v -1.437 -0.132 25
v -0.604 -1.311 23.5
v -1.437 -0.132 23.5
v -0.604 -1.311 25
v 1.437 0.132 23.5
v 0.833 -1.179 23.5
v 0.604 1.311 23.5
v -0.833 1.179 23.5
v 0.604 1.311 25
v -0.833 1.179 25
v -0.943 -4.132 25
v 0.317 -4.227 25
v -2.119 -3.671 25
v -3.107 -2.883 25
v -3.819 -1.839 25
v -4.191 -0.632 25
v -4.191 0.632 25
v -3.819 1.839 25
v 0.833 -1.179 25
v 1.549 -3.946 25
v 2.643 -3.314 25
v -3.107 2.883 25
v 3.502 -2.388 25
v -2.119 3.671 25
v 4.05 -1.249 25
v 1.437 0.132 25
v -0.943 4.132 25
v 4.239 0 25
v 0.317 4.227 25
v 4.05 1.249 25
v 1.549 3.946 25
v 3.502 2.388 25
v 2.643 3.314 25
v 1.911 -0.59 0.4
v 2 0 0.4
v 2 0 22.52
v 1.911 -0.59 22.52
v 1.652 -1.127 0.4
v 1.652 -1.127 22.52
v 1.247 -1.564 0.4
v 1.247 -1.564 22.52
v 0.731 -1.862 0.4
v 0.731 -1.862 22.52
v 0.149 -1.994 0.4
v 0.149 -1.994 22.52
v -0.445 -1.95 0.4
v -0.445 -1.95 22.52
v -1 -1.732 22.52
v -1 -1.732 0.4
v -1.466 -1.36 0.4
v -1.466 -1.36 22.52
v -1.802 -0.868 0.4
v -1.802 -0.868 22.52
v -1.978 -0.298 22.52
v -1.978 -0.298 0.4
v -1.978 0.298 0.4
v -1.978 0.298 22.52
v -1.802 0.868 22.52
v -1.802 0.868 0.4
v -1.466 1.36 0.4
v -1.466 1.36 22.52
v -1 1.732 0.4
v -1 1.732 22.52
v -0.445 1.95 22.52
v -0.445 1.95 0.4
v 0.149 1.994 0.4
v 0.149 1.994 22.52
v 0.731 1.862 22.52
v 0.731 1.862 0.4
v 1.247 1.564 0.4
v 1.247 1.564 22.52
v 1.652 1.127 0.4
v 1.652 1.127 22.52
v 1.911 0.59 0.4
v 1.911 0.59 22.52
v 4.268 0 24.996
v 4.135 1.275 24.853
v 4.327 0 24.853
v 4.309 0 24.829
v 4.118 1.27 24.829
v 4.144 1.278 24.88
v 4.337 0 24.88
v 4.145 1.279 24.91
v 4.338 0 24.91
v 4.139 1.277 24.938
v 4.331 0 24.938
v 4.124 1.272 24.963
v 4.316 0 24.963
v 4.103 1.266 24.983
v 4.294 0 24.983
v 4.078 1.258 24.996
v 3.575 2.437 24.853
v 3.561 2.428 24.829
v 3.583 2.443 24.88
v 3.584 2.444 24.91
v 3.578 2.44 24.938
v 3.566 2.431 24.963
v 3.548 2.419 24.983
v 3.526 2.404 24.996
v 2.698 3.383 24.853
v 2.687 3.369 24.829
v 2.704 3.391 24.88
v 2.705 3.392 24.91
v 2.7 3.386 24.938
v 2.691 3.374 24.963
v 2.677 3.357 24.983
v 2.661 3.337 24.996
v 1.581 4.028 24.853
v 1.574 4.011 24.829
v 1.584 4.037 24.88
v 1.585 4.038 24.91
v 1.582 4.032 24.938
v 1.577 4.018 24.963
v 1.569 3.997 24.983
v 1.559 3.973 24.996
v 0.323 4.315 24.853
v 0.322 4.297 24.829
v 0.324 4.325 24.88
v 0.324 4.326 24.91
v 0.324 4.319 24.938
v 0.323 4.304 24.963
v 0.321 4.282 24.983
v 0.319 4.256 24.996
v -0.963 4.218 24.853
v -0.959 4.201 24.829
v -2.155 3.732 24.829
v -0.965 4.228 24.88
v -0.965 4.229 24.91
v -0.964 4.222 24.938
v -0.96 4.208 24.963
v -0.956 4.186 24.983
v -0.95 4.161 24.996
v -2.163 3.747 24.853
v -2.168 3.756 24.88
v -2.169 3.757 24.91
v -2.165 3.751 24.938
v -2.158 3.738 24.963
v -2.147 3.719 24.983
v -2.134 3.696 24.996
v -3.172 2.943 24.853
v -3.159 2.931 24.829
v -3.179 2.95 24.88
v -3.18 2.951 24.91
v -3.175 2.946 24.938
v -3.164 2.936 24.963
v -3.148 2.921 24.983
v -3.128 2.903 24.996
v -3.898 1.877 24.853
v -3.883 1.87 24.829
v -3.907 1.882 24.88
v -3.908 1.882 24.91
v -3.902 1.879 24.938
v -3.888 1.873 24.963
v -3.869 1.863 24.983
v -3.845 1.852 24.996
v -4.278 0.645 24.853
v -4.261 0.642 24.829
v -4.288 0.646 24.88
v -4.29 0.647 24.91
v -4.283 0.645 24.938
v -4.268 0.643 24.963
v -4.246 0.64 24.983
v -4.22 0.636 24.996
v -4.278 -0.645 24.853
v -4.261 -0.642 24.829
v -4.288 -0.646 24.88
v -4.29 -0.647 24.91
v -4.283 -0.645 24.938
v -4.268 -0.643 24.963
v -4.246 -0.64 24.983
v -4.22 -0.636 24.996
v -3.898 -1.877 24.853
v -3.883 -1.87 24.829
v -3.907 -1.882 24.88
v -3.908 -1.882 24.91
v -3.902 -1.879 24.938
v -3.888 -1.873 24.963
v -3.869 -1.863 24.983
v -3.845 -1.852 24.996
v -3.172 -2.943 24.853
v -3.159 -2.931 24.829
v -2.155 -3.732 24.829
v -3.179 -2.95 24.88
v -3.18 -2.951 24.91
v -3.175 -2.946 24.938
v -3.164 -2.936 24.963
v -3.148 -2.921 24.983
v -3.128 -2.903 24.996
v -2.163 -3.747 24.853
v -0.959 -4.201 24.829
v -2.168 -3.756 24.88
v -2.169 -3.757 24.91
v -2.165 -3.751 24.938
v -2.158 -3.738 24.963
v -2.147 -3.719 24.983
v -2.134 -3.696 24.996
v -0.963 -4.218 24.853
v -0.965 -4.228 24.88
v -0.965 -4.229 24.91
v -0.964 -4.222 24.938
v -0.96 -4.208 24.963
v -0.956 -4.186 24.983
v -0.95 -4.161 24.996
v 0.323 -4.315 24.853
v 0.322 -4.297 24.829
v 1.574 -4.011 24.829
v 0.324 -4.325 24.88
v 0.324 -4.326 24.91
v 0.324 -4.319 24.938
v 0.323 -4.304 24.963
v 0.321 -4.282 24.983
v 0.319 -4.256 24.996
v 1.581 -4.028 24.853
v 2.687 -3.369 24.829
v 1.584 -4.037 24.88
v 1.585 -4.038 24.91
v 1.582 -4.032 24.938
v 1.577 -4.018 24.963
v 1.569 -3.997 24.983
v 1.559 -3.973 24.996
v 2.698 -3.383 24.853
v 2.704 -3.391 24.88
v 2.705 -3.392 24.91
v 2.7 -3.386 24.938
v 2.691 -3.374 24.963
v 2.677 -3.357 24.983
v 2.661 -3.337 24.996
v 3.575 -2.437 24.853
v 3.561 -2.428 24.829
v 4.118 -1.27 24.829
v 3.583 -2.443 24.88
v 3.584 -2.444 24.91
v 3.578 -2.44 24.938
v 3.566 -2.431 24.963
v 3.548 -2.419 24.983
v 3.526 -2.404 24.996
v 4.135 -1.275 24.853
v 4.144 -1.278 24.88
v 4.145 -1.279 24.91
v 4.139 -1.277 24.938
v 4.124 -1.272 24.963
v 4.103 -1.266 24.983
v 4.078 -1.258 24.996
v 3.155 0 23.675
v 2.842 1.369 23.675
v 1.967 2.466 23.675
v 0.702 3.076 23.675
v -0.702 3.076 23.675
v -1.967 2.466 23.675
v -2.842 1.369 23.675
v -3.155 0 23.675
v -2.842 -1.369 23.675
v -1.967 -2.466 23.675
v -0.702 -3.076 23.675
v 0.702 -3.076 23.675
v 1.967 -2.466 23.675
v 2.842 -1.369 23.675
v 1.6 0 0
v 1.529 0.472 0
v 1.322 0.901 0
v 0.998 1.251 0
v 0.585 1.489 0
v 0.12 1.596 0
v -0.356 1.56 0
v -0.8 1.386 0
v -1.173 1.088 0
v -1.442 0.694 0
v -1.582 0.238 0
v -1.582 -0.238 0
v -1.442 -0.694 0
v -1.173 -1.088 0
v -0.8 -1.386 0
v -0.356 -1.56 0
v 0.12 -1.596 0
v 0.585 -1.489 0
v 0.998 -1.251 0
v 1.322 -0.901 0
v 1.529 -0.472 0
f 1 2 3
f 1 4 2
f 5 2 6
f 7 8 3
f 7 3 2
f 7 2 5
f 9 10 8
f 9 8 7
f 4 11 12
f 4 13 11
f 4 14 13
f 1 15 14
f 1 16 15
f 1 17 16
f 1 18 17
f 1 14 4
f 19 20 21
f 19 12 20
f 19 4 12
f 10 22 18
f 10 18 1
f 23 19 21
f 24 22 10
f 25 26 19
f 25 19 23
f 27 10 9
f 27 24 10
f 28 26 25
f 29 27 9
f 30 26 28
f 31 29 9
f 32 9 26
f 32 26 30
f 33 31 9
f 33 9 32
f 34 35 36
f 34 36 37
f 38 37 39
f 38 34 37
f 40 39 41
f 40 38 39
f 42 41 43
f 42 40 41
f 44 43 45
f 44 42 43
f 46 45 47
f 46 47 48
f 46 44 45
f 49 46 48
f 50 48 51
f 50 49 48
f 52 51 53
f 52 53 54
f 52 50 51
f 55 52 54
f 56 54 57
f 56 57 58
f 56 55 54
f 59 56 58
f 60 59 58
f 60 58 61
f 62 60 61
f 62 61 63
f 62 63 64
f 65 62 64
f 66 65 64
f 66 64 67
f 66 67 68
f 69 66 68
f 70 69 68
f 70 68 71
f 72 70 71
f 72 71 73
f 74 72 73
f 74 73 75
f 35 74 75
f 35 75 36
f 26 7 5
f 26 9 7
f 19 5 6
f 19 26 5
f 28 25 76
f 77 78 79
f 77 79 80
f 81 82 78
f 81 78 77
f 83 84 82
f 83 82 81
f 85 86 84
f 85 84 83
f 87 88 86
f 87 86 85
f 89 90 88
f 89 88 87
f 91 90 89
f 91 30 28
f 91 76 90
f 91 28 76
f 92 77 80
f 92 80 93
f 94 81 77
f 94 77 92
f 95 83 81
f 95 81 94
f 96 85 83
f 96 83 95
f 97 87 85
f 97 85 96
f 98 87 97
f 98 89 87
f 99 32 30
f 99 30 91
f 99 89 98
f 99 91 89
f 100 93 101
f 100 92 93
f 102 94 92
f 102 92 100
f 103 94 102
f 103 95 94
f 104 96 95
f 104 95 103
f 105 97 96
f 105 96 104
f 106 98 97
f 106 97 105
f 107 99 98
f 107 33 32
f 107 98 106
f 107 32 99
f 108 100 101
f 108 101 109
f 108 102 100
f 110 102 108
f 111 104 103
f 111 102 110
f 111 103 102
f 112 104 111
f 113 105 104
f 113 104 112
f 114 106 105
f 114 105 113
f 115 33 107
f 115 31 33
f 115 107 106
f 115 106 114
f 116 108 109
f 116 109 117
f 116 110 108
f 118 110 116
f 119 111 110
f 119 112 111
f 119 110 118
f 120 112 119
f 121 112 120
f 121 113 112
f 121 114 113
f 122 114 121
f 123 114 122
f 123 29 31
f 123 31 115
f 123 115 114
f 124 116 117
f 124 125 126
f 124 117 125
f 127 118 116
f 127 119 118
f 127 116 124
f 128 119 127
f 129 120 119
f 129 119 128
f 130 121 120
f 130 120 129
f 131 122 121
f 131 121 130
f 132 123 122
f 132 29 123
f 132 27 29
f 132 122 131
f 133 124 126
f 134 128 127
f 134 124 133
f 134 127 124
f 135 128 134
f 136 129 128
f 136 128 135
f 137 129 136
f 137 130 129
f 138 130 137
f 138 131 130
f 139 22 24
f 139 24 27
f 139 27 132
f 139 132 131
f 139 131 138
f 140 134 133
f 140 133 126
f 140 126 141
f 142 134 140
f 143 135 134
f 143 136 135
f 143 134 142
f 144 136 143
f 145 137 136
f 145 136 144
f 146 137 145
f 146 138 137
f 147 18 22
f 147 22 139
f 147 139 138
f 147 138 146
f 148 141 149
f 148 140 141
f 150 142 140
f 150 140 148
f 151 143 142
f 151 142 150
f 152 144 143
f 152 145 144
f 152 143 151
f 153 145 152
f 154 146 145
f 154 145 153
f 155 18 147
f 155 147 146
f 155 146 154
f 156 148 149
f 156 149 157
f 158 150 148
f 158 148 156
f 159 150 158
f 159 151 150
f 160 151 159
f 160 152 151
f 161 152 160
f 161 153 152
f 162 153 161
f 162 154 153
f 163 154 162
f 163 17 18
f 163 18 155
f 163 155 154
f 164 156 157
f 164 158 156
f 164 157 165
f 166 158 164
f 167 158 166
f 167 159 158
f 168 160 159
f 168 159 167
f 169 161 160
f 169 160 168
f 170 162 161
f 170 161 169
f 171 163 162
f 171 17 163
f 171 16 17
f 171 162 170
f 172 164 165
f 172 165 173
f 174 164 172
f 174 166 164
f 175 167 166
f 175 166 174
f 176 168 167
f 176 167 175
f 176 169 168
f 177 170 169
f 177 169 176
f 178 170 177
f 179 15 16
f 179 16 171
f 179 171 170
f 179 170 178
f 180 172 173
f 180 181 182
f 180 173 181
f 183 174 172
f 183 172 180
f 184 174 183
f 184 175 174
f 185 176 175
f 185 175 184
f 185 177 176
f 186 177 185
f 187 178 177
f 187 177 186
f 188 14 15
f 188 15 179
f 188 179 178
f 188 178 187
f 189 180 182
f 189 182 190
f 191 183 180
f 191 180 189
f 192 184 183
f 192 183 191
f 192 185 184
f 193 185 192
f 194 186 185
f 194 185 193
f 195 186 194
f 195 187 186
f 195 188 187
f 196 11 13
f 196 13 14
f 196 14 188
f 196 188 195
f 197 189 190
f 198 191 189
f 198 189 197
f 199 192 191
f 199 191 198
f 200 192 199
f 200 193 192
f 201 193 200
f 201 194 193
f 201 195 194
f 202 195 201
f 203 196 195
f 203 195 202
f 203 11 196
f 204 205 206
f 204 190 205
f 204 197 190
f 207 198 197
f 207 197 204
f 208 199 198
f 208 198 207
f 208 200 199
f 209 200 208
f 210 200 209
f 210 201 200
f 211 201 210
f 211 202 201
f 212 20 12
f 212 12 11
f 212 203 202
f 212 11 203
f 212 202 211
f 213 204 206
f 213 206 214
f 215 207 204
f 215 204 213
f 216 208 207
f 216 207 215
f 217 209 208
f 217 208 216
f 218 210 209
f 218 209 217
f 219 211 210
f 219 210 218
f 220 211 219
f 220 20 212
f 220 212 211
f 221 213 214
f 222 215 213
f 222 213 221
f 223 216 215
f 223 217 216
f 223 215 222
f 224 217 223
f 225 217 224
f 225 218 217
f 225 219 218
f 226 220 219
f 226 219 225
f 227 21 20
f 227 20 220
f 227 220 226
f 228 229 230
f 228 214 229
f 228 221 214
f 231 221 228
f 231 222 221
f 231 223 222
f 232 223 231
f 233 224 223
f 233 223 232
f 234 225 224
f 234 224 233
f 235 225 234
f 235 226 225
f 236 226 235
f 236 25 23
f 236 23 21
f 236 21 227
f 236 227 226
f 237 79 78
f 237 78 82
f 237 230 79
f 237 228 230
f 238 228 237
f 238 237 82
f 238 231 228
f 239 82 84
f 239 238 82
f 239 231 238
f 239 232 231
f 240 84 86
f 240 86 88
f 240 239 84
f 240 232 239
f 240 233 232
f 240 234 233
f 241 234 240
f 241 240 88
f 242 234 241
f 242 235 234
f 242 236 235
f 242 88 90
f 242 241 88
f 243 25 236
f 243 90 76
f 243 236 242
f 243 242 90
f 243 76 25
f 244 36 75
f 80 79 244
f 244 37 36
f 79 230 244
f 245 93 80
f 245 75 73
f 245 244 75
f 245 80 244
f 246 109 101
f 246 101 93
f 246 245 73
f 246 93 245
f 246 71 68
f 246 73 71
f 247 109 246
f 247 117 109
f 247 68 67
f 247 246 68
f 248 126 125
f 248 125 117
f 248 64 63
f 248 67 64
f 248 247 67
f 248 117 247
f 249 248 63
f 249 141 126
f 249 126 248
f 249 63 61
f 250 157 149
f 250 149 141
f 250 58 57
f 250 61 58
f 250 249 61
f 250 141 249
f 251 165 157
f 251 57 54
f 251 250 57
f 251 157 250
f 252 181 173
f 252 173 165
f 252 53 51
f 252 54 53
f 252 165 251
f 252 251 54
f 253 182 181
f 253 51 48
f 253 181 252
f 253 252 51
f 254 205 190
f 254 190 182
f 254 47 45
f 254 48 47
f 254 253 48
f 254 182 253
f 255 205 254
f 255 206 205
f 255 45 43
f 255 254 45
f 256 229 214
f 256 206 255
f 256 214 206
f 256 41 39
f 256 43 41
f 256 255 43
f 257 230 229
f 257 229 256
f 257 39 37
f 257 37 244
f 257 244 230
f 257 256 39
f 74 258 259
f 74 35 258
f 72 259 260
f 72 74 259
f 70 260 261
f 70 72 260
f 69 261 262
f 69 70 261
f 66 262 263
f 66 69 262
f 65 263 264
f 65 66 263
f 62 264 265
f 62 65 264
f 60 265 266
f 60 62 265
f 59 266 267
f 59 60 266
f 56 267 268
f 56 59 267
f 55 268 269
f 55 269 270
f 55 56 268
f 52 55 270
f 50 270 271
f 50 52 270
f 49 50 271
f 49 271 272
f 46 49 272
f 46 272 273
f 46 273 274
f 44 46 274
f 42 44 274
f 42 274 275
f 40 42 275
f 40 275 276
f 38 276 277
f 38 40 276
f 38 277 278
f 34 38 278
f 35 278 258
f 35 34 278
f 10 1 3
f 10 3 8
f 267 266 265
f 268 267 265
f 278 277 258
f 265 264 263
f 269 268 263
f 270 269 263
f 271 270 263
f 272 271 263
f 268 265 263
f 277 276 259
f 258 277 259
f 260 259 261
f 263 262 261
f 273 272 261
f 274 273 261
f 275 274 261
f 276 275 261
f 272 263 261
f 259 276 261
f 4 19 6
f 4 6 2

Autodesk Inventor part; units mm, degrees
ref_plane "YZ Plane" through (0, 0, 0) normal (1, 0, 0) x (0, 1, 0)
ref_plane "XZ Plane" through (0, 0, 0) normal (0, 1, 0) x (-1, 0, 0)
ref_plane "XY Plane" through (0, 0, 0) normal (0, 0, 1) x (1, 0, 0)
sketch "Sketch1" plane through (0, 0, 0) normal (0, 0, 1) x (1, 0, 0)
  circle A0 centre (0, 0) radius 2
  dimension "Diameter" = 4
extrude "Extrusion1" add sketch "Sketch1" along normal blind 22.52
sketch "Sketch2" plane through (0, 0, 22.52) normal (0, 0, 1) x (1, 0, 0)
  circle A0 centre (0, 0) radius 2 projected
extrude "Extrusion2" add sketch "Sketch2" along normal blind 2.48 draft 45
sketch "Sketch3" plane through (0, 0, 25) normal (0, 0, 1) x (1, 0, 0)
  circle A0 centre (0, 0) radius 4.48 projected
  circle A1 centre (0, 0) radius 1.4434 construction
  line L0 (0.6042, 1.3108) -> (1.4373, 0.1322)
  line L1 (1.4373, 0.1322) -> (0.8331, -1.1787)
  line L2 (0.8331, -1.1787) -> (-0.6042, -1.3108)
  line L3 (-0.6042, -1.3108) -> (-1.4373, -0.1322)
  line L4 (-1.4373, -0.1322) -> (-0.8331, 1.1787)
  line L5 (-0.8331, 1.1787) -> (0.6042, 1.3108)
  dimension "Hex_Width" = 2.5
extrude "Extrusion3" cut sketch "Sketch3" against normal blind 1.5 contours L0 L1 L2 L3 L4 L5
thread "Thread1" size "M4x0.7" class "4g6g" standard "ANSI Metric M Profile" full length
chamfer "Chamfer2" distance 0.4 angle 45 1 edges at (-2, 0, 0)
fillet "Fillet1" radius 0.1 1 edges at (-4.48, 0, 25)
equation "\"d10\" = Thread_Length"
equation "\"d13\" = Chamfer"
equation "\"Thread_Length\" = 7.52"
equation "\"Chamfer\" = 0.4"
properties part number "SCREW, FLAT HD, P, 12_9, M4X0_7X25"
